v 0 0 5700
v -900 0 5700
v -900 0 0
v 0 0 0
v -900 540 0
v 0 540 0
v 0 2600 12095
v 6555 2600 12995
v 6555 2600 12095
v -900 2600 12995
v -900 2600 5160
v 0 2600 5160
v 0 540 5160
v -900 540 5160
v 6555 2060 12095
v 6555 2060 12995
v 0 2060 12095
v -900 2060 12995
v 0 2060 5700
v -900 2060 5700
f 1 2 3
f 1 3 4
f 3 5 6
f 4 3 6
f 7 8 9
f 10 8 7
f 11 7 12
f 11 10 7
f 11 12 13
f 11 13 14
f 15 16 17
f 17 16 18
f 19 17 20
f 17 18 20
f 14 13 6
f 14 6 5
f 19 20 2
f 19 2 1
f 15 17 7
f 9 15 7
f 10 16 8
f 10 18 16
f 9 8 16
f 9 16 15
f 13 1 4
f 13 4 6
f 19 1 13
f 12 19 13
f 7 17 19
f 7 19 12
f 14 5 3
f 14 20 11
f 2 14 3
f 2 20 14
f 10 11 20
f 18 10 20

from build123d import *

# Parameters (mm, degrees)
SKETCH1_W           = 900
SKETCH1_H           = 540
SKETCH4_W           = 900
SKETCH4_H           = 540
BOSS_EXTRUDE1_DEPTH = 6555


with BuildPart() as part:
    # Sweep1: sweep along a path in Sketch2
    with BuildLine(Plane(origin=(0, 0, 0), x_dir=(0, 0, -1), z_dir=(1, 0, 0))) as sweep1_path:
        Line((0, 270), (-5430, 270))
        Line((-5430, 270), (-5430, 2330))
        Line((-5430, 2330), (-12995, 2330))
    # Sketch1 → Sweep1 (sweep)
    with BuildSketch(Plane.XY):
        with Locations((-450, 270)):
            Rectangle(SKETCH1_W, SKETCH1_H)
    sweep(path=sweep1_path.line, transition=Transition.RIGHT)

    # Sketch4 → Boss-Extrude1 (add)
    with BuildSketch(Plane(origin=(0, 0, 0), x_dir=(0, 0, -1), z_dir=(1, 0, 0))):
        with Locations((-12545, 2330)):
            Rectangle(SKETCH4_W, SKETCH4_H)
    extrude(amount=BOSS_EXTRUDE1_DEPTH)


solid = part.part
